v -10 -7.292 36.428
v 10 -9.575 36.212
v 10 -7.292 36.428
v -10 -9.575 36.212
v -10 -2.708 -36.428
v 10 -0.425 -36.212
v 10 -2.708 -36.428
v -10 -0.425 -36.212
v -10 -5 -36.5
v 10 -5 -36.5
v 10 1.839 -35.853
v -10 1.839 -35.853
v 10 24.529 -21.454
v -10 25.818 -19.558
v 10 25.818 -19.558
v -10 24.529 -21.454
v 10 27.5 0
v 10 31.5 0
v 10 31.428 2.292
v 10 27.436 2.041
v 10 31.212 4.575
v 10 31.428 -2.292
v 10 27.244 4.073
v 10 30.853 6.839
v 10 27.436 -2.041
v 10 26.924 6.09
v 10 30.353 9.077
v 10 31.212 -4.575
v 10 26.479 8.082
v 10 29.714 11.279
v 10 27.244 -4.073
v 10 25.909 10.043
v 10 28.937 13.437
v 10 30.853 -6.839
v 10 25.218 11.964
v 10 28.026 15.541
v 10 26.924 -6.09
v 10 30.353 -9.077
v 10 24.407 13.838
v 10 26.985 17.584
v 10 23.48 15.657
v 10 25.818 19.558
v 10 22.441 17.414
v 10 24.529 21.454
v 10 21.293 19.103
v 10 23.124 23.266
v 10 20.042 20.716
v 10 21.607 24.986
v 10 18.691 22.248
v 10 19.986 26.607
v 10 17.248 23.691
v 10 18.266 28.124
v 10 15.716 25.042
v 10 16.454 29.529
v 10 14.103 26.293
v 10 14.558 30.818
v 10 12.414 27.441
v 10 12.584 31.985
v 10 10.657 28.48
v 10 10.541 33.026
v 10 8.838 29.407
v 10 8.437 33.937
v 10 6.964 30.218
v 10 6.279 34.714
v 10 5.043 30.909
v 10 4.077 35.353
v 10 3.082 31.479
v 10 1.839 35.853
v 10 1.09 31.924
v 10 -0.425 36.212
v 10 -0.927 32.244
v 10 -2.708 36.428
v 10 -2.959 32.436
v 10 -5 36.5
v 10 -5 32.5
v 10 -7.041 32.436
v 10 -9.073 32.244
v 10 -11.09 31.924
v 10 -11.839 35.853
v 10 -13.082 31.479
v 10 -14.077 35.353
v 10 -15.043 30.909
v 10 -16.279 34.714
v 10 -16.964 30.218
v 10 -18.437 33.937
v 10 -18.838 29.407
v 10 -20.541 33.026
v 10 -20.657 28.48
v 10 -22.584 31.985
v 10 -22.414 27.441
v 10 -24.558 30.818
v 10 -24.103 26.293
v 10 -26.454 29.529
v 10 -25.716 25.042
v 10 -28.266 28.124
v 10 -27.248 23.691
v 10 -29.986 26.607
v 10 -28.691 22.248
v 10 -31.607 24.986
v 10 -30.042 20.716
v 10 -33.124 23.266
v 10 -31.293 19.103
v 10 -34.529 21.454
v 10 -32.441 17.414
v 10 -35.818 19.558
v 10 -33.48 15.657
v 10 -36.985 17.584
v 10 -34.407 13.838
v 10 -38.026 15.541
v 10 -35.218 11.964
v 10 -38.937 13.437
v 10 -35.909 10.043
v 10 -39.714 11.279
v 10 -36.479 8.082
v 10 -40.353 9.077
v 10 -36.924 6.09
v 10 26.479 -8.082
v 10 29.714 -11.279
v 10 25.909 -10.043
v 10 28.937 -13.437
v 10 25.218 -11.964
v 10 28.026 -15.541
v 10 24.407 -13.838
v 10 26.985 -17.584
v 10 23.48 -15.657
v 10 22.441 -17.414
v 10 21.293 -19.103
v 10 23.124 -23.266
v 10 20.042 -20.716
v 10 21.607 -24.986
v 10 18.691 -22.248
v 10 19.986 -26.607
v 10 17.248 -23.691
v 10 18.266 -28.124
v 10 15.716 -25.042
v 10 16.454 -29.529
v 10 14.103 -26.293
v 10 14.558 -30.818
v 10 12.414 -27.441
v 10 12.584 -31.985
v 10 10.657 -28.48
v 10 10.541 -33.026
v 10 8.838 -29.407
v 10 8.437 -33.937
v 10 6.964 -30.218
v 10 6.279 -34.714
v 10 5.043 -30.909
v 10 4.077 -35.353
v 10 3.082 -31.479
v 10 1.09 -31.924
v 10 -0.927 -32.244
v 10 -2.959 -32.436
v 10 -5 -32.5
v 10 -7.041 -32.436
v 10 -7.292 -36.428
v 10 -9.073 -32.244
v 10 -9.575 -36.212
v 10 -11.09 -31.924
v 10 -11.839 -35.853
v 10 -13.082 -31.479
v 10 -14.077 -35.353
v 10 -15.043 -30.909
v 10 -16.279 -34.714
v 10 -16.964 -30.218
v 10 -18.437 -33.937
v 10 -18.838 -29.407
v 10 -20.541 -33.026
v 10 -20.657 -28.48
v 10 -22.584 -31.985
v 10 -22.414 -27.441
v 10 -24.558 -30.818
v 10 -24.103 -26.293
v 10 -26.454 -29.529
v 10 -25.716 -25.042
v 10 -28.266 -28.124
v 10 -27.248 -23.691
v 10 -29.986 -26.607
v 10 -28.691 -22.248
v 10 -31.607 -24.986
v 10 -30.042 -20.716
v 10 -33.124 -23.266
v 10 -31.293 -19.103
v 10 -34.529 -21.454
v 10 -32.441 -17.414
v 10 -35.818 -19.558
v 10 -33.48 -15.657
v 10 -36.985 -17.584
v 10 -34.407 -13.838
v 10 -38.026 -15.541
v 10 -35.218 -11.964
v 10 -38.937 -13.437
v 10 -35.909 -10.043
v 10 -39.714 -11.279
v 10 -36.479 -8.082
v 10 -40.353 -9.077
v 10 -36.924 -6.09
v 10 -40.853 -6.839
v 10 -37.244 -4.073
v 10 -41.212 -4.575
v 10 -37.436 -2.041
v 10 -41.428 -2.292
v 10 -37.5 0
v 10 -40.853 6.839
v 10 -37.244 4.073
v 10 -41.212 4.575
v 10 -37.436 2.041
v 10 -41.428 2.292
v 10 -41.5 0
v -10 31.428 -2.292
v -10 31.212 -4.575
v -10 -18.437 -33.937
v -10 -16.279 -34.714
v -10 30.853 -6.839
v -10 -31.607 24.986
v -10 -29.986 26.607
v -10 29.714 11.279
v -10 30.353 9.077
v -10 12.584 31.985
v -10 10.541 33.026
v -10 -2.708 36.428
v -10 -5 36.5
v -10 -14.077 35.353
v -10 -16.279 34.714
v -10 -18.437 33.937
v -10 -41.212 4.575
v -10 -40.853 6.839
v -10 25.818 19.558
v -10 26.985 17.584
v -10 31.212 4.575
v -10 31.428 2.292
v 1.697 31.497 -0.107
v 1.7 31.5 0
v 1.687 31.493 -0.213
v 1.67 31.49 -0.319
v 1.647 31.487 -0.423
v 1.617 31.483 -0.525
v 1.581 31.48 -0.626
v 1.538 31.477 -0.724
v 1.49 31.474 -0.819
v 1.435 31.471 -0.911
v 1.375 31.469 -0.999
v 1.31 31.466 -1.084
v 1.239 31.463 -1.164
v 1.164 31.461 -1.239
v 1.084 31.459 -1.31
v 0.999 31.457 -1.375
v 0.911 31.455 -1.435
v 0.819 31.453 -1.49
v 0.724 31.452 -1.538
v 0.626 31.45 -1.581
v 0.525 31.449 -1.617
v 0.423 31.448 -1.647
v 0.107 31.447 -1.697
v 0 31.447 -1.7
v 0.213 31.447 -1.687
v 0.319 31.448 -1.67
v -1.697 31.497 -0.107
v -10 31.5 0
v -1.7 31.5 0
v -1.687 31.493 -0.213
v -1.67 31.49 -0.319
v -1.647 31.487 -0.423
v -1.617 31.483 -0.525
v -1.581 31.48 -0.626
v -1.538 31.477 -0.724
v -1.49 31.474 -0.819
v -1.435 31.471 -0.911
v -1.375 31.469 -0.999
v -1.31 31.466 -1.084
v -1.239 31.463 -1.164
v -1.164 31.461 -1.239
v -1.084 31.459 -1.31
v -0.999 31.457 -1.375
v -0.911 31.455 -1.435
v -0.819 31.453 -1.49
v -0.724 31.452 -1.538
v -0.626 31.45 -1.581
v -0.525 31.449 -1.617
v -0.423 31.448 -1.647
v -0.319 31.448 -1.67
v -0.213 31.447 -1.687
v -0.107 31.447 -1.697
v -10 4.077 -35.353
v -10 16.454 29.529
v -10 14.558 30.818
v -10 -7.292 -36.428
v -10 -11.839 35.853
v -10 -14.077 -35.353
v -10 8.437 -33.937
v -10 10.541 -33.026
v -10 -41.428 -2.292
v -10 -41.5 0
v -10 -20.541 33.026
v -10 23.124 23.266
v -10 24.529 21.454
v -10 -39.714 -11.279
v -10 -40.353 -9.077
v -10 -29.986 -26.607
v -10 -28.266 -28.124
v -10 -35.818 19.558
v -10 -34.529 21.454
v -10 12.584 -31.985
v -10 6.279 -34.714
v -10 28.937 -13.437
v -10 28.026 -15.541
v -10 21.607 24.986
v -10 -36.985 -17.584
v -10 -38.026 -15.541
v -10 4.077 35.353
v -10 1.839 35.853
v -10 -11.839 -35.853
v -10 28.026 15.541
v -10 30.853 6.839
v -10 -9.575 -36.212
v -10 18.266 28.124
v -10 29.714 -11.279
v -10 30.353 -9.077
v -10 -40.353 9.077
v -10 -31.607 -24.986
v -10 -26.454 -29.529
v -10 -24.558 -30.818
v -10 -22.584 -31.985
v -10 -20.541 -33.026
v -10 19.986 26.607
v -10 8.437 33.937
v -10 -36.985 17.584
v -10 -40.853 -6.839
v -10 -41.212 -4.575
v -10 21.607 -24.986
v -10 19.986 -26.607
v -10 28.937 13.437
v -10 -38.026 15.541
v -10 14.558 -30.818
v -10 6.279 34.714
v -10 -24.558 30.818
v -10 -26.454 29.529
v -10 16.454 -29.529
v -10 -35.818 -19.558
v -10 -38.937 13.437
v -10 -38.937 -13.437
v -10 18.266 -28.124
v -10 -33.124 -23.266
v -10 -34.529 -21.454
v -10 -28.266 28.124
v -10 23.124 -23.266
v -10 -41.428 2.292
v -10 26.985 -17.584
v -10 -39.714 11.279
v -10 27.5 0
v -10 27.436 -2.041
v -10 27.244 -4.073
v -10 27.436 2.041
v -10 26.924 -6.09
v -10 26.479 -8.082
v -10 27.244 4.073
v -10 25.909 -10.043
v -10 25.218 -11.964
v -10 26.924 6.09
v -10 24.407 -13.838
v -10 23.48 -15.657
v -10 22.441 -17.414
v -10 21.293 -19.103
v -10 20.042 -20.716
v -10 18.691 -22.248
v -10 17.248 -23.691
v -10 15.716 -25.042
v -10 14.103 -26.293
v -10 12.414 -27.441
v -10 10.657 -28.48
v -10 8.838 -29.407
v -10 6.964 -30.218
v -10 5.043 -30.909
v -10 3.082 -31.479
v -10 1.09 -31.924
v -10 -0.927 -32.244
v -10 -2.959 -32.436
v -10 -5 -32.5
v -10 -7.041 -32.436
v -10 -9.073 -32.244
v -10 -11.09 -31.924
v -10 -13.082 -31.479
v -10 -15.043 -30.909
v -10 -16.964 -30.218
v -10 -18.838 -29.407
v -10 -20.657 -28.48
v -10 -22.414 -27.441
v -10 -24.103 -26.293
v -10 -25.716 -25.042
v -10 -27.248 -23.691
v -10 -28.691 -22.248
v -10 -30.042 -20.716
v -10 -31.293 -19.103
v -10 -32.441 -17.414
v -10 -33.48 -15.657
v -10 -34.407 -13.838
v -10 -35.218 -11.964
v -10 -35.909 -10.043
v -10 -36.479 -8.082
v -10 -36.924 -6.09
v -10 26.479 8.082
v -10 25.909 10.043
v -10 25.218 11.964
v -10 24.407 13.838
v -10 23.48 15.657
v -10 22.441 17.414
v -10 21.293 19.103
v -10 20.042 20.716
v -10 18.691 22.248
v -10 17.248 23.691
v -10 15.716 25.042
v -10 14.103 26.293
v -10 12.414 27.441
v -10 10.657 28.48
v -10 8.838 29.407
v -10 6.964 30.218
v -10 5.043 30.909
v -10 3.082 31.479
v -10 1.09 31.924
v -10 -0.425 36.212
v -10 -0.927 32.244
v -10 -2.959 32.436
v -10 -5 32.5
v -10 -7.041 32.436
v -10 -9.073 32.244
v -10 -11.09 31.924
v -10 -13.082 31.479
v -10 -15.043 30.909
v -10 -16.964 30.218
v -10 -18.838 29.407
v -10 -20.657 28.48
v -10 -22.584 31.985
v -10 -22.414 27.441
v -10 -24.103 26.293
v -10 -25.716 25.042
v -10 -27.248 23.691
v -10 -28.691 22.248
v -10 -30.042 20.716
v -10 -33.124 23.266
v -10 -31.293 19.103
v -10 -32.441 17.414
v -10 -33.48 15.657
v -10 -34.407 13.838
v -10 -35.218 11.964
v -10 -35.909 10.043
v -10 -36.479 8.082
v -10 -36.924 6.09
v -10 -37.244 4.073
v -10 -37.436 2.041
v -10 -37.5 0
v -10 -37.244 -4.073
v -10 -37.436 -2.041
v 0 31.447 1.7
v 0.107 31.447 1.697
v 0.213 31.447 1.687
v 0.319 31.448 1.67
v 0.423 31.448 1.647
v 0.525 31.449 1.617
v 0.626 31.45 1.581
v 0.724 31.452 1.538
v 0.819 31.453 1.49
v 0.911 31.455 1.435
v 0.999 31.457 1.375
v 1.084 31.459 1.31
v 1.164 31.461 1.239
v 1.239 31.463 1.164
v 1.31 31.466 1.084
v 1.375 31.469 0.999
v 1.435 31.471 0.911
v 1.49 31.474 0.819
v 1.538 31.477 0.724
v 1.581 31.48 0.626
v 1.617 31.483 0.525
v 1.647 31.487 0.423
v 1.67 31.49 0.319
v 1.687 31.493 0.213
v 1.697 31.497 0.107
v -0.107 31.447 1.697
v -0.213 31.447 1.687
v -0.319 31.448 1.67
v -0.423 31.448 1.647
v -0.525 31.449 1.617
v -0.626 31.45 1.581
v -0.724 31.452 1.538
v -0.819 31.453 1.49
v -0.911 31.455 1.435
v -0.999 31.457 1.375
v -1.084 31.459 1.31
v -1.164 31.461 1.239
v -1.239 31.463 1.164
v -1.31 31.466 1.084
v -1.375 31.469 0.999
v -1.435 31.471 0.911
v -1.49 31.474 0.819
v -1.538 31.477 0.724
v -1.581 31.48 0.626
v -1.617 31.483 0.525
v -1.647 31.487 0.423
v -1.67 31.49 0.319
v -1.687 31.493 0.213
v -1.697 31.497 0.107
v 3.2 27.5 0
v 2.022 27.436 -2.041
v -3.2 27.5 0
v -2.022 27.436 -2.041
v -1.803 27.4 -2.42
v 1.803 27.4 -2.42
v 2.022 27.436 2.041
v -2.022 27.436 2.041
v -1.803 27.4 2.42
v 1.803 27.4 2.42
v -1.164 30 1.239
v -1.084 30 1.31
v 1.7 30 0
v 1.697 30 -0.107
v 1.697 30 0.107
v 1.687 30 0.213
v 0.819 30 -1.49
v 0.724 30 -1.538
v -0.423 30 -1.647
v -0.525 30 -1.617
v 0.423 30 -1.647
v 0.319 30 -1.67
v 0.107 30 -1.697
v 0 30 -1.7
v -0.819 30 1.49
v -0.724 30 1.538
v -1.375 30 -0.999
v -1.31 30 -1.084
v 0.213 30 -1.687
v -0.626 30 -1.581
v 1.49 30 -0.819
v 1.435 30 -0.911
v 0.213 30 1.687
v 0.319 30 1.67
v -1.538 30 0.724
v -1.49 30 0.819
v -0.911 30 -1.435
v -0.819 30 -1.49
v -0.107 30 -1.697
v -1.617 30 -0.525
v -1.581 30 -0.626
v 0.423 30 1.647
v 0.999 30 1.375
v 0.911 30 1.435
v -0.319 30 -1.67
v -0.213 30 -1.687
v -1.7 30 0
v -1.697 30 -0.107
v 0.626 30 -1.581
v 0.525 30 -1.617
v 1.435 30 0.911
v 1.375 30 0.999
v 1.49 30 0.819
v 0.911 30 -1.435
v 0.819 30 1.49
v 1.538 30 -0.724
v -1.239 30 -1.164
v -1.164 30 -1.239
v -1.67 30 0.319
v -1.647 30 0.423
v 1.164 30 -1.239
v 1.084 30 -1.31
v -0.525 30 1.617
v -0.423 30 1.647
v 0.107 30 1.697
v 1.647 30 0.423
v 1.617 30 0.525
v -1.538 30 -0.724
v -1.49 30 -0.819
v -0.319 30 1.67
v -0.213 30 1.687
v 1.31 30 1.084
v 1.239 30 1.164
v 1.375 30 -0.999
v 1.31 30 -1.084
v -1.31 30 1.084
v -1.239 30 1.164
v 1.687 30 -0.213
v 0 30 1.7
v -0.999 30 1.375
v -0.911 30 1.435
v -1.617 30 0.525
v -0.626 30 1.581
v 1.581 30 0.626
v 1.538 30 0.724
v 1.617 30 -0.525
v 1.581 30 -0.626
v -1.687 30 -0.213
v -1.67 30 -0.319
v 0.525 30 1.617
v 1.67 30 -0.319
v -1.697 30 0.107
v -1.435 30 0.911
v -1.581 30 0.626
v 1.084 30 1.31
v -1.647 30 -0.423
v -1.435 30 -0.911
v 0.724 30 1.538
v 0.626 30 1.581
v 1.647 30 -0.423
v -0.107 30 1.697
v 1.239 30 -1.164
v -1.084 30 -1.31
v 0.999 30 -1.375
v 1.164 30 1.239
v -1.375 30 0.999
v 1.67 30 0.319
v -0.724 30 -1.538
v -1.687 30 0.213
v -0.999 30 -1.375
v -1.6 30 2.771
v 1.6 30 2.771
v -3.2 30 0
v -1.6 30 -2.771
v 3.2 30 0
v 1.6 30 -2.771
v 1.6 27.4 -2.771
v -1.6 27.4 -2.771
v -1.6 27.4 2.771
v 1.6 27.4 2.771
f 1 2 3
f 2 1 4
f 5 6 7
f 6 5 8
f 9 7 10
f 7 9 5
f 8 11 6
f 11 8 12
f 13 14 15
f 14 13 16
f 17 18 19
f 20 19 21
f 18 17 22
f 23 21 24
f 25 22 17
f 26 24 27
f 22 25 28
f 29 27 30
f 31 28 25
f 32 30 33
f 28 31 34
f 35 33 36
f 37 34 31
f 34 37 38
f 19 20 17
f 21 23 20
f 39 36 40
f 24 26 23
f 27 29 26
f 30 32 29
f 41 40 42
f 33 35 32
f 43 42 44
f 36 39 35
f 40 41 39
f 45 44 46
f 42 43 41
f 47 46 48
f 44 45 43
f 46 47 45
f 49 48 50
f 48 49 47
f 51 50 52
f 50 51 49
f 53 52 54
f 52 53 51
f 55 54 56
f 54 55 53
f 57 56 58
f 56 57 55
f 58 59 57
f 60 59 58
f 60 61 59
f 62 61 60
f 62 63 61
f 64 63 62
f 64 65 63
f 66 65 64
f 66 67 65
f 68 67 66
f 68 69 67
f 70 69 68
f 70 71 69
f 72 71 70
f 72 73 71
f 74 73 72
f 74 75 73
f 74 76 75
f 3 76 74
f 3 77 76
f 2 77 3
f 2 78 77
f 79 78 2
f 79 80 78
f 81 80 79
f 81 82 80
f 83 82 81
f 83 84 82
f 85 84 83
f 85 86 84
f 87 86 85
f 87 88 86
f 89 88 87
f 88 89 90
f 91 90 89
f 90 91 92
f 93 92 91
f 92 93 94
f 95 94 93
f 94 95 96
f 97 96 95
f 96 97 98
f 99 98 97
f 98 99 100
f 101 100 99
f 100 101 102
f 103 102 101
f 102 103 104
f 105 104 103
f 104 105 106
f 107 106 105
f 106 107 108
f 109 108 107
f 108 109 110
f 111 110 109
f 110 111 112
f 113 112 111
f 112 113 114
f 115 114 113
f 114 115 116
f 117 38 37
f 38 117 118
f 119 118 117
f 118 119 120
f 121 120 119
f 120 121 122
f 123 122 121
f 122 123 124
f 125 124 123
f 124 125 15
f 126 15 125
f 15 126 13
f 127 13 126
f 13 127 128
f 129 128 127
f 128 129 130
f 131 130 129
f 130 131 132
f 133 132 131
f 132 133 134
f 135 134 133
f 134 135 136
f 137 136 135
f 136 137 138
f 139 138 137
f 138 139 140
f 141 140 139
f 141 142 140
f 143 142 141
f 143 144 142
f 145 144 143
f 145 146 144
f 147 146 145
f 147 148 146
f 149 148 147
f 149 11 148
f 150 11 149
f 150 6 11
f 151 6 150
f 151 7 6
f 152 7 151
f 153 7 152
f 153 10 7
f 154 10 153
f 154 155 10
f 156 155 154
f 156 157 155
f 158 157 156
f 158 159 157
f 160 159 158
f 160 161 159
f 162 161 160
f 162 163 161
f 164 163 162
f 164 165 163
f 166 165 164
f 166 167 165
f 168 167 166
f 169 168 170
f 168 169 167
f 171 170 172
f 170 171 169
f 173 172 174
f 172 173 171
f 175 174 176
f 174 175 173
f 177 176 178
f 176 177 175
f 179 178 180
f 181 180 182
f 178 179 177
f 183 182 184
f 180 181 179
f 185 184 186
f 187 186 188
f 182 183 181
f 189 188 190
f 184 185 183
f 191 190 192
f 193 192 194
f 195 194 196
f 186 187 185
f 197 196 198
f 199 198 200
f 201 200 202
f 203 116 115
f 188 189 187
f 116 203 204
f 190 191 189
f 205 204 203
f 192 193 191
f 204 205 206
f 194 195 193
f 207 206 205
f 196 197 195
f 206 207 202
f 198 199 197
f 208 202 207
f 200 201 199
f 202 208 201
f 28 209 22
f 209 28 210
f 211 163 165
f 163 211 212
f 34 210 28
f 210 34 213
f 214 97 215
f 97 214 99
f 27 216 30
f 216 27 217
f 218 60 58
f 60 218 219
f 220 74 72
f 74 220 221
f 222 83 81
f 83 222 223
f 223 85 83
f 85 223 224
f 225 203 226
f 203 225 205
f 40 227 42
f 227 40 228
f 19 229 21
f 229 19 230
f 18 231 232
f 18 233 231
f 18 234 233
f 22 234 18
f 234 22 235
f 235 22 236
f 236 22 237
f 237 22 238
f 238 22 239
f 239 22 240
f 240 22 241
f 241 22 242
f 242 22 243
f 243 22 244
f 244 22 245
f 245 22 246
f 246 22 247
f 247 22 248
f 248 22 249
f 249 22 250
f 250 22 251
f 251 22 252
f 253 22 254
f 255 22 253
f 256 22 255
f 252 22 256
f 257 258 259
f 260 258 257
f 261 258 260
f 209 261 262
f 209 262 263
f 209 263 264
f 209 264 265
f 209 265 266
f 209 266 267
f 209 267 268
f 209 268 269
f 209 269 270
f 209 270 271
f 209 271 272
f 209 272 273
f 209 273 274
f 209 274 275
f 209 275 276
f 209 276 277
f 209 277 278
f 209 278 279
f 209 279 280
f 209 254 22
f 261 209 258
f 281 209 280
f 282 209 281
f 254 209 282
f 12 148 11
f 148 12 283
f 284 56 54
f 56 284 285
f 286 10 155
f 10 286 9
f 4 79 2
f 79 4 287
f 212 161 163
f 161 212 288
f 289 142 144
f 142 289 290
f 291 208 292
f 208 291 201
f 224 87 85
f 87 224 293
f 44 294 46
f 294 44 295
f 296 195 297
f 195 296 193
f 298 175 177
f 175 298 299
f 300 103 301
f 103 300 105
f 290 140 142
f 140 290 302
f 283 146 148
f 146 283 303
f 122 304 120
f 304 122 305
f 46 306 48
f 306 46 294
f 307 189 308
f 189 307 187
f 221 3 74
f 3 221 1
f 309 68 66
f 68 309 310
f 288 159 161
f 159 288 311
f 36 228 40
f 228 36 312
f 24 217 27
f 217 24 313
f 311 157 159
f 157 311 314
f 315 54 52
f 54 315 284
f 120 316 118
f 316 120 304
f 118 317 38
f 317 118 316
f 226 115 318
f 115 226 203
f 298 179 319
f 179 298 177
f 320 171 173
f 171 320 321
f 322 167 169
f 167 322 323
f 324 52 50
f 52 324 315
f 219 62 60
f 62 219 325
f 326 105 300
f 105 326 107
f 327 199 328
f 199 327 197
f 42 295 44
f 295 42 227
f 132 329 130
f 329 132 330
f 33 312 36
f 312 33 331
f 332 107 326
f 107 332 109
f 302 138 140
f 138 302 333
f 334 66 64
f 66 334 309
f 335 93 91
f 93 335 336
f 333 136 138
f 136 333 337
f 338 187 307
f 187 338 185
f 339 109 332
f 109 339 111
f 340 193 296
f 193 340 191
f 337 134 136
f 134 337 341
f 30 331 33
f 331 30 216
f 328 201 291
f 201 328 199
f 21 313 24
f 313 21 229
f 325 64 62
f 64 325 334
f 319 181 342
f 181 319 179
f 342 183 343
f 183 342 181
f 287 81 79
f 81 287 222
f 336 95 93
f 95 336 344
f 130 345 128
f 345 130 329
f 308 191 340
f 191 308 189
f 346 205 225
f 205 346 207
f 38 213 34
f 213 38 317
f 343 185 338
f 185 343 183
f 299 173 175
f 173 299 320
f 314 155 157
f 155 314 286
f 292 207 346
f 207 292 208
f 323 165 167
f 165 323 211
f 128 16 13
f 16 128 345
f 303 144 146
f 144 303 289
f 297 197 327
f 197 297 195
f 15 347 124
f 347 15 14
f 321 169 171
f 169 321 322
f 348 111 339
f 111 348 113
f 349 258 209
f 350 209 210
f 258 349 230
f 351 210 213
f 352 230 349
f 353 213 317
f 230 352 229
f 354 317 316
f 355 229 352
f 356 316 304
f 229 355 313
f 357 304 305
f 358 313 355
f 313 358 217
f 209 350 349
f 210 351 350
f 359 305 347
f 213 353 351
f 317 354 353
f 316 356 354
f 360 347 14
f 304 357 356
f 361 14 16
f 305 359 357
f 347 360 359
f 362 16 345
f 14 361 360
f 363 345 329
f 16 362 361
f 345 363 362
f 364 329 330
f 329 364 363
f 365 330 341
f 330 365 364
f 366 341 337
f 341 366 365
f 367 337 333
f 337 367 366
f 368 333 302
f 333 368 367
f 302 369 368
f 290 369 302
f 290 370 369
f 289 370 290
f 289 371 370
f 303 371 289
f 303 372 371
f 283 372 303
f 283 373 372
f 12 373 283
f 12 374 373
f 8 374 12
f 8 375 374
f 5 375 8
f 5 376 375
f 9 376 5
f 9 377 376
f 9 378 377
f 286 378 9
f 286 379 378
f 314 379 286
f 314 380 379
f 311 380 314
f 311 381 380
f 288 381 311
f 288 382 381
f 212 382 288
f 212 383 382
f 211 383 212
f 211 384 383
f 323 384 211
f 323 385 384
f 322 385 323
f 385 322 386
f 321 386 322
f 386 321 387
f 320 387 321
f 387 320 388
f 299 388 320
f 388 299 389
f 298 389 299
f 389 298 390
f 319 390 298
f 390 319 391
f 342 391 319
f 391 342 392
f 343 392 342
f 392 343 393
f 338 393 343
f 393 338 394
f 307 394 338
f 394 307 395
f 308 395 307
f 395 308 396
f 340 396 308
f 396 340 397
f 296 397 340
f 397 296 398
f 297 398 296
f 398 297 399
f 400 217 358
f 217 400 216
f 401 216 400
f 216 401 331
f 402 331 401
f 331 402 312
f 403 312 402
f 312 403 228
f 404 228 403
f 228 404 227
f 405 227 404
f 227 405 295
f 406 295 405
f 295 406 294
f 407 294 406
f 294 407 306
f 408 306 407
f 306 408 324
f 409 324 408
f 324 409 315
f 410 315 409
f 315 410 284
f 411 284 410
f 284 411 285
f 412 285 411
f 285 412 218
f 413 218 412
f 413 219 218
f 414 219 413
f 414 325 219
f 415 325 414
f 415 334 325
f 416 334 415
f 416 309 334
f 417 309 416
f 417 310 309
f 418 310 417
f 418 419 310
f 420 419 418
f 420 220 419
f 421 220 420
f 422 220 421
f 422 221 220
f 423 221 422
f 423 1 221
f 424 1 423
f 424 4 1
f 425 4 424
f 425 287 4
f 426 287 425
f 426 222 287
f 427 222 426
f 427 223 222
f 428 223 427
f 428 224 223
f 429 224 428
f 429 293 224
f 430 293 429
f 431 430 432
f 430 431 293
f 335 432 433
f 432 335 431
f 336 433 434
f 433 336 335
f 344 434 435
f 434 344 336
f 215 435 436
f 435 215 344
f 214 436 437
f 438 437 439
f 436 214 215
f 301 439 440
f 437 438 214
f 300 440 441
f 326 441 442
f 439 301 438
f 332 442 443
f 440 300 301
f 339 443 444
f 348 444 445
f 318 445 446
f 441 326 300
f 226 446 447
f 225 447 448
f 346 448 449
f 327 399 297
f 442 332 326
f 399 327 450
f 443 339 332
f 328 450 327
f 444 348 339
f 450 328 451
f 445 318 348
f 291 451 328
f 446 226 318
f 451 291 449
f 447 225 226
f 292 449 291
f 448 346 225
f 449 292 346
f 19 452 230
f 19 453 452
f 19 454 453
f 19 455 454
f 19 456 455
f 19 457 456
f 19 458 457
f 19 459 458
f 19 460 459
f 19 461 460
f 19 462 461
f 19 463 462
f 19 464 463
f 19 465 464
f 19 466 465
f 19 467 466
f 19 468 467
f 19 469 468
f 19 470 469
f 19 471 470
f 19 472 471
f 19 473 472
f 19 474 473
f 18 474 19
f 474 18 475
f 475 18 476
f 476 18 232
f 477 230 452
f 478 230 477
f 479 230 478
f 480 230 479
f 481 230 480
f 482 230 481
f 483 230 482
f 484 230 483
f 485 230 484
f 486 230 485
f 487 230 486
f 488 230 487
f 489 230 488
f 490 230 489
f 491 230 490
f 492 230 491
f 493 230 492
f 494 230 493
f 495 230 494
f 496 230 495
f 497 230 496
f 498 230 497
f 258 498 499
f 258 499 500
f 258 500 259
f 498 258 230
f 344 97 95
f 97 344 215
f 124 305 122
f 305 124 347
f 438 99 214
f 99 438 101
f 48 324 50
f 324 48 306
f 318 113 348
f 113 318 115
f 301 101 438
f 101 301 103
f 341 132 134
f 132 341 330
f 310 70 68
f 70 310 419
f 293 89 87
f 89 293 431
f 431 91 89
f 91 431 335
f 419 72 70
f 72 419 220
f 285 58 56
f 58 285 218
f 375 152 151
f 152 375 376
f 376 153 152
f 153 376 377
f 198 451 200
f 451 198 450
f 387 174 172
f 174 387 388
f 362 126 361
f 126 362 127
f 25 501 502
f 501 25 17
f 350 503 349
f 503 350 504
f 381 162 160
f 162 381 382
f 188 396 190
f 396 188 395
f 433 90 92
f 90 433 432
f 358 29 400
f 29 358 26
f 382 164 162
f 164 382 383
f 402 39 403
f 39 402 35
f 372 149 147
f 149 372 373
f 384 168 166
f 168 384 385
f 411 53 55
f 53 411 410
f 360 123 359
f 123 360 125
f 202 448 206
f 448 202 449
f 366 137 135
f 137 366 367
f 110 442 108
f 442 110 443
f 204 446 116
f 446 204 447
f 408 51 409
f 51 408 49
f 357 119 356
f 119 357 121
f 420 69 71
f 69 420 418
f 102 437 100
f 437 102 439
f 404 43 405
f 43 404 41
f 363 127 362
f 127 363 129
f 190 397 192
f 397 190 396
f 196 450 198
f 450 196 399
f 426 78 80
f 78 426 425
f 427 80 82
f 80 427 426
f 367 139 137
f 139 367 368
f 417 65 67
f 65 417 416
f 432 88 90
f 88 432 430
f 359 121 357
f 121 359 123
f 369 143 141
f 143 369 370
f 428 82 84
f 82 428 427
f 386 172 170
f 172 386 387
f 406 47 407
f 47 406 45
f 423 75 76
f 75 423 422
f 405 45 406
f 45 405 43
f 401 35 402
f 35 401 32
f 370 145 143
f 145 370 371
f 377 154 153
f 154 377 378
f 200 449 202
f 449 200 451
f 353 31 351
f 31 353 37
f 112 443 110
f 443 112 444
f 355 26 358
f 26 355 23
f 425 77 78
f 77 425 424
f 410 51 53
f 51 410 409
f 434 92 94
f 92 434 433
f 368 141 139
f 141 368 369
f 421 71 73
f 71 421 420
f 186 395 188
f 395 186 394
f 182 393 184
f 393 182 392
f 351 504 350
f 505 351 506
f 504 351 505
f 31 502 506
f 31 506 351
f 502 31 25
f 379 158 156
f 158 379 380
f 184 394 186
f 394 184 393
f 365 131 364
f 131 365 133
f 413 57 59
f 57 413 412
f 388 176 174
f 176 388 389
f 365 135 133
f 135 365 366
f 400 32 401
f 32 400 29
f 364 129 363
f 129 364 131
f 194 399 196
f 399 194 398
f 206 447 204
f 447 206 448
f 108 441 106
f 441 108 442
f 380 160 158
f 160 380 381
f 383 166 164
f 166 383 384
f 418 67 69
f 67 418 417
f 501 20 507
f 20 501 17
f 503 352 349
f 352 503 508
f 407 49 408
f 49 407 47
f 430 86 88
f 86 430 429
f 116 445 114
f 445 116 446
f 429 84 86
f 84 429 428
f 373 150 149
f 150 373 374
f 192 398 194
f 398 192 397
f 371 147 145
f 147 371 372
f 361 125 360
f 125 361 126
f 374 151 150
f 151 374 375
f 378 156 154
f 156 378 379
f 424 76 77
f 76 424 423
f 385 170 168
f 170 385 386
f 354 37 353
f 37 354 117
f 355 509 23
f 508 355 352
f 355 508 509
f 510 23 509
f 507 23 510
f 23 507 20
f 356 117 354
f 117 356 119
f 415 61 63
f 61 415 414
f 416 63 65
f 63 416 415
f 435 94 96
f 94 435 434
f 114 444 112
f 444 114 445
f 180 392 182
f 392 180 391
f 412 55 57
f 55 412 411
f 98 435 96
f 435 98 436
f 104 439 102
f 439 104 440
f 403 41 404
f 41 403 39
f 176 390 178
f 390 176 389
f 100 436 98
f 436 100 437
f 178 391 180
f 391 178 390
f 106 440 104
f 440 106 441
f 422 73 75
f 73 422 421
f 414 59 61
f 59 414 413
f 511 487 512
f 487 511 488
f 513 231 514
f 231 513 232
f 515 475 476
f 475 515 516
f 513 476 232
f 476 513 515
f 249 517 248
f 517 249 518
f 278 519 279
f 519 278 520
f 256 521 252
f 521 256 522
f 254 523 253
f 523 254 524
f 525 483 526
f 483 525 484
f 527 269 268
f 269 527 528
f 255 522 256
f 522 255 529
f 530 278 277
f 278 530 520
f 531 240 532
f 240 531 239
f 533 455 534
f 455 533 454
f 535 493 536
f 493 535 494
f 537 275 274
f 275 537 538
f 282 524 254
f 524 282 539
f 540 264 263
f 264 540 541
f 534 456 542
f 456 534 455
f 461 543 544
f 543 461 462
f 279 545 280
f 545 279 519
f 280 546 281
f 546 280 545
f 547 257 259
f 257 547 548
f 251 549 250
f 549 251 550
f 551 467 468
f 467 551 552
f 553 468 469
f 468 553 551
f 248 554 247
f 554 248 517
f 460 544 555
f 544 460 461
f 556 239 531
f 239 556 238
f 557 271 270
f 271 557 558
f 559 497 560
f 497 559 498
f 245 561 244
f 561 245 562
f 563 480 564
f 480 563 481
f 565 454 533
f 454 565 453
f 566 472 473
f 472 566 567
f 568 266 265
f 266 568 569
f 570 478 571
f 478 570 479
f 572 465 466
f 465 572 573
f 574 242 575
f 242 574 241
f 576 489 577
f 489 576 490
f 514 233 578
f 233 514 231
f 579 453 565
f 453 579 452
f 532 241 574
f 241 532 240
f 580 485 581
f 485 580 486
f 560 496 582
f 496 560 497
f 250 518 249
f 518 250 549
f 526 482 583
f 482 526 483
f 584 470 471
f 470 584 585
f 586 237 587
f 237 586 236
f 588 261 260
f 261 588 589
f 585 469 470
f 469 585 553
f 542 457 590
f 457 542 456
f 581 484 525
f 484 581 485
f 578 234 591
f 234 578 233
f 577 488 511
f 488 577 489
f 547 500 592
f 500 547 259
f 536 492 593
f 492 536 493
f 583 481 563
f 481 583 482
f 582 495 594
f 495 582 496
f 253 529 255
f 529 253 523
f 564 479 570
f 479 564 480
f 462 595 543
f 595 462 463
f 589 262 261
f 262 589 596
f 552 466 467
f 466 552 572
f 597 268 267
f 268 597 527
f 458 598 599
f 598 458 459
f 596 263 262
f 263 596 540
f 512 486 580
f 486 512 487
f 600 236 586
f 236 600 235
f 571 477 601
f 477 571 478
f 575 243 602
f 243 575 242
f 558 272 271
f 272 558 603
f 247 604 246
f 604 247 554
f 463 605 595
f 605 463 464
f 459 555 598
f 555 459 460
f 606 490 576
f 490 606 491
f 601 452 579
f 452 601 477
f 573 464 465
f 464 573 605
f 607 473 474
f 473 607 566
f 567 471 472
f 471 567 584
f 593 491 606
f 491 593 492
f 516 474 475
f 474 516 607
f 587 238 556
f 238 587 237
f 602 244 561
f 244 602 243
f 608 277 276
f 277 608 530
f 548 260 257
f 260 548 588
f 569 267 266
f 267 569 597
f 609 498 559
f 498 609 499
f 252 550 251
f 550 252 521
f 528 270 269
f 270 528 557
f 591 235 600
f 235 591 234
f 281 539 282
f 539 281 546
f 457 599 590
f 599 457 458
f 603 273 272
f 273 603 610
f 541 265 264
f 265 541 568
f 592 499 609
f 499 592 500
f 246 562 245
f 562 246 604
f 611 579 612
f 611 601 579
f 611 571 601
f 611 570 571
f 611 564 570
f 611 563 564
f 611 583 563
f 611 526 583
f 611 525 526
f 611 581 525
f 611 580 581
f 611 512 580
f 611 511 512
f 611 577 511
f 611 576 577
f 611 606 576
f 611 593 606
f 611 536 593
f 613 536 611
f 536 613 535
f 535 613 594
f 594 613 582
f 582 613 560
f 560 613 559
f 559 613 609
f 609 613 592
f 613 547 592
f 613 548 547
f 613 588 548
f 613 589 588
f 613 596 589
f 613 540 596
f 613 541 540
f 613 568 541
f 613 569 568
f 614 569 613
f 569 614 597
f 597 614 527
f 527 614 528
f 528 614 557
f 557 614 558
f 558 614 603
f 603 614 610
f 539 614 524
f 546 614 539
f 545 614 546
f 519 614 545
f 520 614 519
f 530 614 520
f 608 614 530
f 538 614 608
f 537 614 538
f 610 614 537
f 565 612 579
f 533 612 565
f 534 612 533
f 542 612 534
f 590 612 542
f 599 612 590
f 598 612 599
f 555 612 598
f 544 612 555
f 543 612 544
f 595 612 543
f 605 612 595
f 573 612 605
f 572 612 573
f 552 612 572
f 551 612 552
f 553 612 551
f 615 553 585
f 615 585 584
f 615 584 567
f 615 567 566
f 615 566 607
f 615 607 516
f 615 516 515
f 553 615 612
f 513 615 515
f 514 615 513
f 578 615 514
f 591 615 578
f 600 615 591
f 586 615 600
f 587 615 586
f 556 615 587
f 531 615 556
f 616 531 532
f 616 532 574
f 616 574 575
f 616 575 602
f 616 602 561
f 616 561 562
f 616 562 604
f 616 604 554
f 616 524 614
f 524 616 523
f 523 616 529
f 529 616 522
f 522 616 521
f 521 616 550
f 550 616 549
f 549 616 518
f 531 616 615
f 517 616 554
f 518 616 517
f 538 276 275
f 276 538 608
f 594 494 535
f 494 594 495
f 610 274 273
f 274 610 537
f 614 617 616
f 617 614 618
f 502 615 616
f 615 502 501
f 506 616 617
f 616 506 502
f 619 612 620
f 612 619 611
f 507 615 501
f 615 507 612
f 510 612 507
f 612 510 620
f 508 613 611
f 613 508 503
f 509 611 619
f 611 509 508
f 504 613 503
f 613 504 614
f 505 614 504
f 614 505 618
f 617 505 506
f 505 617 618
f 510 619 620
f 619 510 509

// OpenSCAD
$fn=100;
module stl () {
    import ("C:\\Users\\Skazzi\\Desktop\\Joz\\Mount_fixed.stl", convexity = 10);
}
module bar(){
difference(){
    scale ([0.94,0.94,0.94])stl();
    cupholder();
    translate([0,-6.7,0])cylinder(d=73, h=80, center = true);
    cut();
    translate([0,35.3,0])rotate([90,0,0])bolt();
}
}

//%translate([0,58,0])cylinder (d=31.8, h =100);

module cut(){
for (i =[-1,1]){
    
translate([19.4*i,0,0])rotate([90,0,0])cylinder(d= 3.4, h=300, center = true, $fn = 100);
}
}

module bolt(){
    cylinder (h=8, d=3.4, center=true); // rezbaonly
    translate([0,0,8/2+2.6/2])cylinder (h=2.6, d=6.4, $fn=6, center=true); //guika
    translate([0,0,-8/2-2.6/2])cylinder (h=2.6, d=6.4, $fn=100, center=true); // golovka
}

module cupholder(){
    for(i=[1,1]){
rotate([0,90*i,0])
translate([0,-5,0])
difference(){
cylinder(d=73, h=20, center = true);
    cylinder(d=65,h=80, center=true);
}
}
}
module holder1(){
difference(){
cupholder();
    translate([0,34,0])rotate([90,0,0])bolt();
}
}

holder1();
//bar();
